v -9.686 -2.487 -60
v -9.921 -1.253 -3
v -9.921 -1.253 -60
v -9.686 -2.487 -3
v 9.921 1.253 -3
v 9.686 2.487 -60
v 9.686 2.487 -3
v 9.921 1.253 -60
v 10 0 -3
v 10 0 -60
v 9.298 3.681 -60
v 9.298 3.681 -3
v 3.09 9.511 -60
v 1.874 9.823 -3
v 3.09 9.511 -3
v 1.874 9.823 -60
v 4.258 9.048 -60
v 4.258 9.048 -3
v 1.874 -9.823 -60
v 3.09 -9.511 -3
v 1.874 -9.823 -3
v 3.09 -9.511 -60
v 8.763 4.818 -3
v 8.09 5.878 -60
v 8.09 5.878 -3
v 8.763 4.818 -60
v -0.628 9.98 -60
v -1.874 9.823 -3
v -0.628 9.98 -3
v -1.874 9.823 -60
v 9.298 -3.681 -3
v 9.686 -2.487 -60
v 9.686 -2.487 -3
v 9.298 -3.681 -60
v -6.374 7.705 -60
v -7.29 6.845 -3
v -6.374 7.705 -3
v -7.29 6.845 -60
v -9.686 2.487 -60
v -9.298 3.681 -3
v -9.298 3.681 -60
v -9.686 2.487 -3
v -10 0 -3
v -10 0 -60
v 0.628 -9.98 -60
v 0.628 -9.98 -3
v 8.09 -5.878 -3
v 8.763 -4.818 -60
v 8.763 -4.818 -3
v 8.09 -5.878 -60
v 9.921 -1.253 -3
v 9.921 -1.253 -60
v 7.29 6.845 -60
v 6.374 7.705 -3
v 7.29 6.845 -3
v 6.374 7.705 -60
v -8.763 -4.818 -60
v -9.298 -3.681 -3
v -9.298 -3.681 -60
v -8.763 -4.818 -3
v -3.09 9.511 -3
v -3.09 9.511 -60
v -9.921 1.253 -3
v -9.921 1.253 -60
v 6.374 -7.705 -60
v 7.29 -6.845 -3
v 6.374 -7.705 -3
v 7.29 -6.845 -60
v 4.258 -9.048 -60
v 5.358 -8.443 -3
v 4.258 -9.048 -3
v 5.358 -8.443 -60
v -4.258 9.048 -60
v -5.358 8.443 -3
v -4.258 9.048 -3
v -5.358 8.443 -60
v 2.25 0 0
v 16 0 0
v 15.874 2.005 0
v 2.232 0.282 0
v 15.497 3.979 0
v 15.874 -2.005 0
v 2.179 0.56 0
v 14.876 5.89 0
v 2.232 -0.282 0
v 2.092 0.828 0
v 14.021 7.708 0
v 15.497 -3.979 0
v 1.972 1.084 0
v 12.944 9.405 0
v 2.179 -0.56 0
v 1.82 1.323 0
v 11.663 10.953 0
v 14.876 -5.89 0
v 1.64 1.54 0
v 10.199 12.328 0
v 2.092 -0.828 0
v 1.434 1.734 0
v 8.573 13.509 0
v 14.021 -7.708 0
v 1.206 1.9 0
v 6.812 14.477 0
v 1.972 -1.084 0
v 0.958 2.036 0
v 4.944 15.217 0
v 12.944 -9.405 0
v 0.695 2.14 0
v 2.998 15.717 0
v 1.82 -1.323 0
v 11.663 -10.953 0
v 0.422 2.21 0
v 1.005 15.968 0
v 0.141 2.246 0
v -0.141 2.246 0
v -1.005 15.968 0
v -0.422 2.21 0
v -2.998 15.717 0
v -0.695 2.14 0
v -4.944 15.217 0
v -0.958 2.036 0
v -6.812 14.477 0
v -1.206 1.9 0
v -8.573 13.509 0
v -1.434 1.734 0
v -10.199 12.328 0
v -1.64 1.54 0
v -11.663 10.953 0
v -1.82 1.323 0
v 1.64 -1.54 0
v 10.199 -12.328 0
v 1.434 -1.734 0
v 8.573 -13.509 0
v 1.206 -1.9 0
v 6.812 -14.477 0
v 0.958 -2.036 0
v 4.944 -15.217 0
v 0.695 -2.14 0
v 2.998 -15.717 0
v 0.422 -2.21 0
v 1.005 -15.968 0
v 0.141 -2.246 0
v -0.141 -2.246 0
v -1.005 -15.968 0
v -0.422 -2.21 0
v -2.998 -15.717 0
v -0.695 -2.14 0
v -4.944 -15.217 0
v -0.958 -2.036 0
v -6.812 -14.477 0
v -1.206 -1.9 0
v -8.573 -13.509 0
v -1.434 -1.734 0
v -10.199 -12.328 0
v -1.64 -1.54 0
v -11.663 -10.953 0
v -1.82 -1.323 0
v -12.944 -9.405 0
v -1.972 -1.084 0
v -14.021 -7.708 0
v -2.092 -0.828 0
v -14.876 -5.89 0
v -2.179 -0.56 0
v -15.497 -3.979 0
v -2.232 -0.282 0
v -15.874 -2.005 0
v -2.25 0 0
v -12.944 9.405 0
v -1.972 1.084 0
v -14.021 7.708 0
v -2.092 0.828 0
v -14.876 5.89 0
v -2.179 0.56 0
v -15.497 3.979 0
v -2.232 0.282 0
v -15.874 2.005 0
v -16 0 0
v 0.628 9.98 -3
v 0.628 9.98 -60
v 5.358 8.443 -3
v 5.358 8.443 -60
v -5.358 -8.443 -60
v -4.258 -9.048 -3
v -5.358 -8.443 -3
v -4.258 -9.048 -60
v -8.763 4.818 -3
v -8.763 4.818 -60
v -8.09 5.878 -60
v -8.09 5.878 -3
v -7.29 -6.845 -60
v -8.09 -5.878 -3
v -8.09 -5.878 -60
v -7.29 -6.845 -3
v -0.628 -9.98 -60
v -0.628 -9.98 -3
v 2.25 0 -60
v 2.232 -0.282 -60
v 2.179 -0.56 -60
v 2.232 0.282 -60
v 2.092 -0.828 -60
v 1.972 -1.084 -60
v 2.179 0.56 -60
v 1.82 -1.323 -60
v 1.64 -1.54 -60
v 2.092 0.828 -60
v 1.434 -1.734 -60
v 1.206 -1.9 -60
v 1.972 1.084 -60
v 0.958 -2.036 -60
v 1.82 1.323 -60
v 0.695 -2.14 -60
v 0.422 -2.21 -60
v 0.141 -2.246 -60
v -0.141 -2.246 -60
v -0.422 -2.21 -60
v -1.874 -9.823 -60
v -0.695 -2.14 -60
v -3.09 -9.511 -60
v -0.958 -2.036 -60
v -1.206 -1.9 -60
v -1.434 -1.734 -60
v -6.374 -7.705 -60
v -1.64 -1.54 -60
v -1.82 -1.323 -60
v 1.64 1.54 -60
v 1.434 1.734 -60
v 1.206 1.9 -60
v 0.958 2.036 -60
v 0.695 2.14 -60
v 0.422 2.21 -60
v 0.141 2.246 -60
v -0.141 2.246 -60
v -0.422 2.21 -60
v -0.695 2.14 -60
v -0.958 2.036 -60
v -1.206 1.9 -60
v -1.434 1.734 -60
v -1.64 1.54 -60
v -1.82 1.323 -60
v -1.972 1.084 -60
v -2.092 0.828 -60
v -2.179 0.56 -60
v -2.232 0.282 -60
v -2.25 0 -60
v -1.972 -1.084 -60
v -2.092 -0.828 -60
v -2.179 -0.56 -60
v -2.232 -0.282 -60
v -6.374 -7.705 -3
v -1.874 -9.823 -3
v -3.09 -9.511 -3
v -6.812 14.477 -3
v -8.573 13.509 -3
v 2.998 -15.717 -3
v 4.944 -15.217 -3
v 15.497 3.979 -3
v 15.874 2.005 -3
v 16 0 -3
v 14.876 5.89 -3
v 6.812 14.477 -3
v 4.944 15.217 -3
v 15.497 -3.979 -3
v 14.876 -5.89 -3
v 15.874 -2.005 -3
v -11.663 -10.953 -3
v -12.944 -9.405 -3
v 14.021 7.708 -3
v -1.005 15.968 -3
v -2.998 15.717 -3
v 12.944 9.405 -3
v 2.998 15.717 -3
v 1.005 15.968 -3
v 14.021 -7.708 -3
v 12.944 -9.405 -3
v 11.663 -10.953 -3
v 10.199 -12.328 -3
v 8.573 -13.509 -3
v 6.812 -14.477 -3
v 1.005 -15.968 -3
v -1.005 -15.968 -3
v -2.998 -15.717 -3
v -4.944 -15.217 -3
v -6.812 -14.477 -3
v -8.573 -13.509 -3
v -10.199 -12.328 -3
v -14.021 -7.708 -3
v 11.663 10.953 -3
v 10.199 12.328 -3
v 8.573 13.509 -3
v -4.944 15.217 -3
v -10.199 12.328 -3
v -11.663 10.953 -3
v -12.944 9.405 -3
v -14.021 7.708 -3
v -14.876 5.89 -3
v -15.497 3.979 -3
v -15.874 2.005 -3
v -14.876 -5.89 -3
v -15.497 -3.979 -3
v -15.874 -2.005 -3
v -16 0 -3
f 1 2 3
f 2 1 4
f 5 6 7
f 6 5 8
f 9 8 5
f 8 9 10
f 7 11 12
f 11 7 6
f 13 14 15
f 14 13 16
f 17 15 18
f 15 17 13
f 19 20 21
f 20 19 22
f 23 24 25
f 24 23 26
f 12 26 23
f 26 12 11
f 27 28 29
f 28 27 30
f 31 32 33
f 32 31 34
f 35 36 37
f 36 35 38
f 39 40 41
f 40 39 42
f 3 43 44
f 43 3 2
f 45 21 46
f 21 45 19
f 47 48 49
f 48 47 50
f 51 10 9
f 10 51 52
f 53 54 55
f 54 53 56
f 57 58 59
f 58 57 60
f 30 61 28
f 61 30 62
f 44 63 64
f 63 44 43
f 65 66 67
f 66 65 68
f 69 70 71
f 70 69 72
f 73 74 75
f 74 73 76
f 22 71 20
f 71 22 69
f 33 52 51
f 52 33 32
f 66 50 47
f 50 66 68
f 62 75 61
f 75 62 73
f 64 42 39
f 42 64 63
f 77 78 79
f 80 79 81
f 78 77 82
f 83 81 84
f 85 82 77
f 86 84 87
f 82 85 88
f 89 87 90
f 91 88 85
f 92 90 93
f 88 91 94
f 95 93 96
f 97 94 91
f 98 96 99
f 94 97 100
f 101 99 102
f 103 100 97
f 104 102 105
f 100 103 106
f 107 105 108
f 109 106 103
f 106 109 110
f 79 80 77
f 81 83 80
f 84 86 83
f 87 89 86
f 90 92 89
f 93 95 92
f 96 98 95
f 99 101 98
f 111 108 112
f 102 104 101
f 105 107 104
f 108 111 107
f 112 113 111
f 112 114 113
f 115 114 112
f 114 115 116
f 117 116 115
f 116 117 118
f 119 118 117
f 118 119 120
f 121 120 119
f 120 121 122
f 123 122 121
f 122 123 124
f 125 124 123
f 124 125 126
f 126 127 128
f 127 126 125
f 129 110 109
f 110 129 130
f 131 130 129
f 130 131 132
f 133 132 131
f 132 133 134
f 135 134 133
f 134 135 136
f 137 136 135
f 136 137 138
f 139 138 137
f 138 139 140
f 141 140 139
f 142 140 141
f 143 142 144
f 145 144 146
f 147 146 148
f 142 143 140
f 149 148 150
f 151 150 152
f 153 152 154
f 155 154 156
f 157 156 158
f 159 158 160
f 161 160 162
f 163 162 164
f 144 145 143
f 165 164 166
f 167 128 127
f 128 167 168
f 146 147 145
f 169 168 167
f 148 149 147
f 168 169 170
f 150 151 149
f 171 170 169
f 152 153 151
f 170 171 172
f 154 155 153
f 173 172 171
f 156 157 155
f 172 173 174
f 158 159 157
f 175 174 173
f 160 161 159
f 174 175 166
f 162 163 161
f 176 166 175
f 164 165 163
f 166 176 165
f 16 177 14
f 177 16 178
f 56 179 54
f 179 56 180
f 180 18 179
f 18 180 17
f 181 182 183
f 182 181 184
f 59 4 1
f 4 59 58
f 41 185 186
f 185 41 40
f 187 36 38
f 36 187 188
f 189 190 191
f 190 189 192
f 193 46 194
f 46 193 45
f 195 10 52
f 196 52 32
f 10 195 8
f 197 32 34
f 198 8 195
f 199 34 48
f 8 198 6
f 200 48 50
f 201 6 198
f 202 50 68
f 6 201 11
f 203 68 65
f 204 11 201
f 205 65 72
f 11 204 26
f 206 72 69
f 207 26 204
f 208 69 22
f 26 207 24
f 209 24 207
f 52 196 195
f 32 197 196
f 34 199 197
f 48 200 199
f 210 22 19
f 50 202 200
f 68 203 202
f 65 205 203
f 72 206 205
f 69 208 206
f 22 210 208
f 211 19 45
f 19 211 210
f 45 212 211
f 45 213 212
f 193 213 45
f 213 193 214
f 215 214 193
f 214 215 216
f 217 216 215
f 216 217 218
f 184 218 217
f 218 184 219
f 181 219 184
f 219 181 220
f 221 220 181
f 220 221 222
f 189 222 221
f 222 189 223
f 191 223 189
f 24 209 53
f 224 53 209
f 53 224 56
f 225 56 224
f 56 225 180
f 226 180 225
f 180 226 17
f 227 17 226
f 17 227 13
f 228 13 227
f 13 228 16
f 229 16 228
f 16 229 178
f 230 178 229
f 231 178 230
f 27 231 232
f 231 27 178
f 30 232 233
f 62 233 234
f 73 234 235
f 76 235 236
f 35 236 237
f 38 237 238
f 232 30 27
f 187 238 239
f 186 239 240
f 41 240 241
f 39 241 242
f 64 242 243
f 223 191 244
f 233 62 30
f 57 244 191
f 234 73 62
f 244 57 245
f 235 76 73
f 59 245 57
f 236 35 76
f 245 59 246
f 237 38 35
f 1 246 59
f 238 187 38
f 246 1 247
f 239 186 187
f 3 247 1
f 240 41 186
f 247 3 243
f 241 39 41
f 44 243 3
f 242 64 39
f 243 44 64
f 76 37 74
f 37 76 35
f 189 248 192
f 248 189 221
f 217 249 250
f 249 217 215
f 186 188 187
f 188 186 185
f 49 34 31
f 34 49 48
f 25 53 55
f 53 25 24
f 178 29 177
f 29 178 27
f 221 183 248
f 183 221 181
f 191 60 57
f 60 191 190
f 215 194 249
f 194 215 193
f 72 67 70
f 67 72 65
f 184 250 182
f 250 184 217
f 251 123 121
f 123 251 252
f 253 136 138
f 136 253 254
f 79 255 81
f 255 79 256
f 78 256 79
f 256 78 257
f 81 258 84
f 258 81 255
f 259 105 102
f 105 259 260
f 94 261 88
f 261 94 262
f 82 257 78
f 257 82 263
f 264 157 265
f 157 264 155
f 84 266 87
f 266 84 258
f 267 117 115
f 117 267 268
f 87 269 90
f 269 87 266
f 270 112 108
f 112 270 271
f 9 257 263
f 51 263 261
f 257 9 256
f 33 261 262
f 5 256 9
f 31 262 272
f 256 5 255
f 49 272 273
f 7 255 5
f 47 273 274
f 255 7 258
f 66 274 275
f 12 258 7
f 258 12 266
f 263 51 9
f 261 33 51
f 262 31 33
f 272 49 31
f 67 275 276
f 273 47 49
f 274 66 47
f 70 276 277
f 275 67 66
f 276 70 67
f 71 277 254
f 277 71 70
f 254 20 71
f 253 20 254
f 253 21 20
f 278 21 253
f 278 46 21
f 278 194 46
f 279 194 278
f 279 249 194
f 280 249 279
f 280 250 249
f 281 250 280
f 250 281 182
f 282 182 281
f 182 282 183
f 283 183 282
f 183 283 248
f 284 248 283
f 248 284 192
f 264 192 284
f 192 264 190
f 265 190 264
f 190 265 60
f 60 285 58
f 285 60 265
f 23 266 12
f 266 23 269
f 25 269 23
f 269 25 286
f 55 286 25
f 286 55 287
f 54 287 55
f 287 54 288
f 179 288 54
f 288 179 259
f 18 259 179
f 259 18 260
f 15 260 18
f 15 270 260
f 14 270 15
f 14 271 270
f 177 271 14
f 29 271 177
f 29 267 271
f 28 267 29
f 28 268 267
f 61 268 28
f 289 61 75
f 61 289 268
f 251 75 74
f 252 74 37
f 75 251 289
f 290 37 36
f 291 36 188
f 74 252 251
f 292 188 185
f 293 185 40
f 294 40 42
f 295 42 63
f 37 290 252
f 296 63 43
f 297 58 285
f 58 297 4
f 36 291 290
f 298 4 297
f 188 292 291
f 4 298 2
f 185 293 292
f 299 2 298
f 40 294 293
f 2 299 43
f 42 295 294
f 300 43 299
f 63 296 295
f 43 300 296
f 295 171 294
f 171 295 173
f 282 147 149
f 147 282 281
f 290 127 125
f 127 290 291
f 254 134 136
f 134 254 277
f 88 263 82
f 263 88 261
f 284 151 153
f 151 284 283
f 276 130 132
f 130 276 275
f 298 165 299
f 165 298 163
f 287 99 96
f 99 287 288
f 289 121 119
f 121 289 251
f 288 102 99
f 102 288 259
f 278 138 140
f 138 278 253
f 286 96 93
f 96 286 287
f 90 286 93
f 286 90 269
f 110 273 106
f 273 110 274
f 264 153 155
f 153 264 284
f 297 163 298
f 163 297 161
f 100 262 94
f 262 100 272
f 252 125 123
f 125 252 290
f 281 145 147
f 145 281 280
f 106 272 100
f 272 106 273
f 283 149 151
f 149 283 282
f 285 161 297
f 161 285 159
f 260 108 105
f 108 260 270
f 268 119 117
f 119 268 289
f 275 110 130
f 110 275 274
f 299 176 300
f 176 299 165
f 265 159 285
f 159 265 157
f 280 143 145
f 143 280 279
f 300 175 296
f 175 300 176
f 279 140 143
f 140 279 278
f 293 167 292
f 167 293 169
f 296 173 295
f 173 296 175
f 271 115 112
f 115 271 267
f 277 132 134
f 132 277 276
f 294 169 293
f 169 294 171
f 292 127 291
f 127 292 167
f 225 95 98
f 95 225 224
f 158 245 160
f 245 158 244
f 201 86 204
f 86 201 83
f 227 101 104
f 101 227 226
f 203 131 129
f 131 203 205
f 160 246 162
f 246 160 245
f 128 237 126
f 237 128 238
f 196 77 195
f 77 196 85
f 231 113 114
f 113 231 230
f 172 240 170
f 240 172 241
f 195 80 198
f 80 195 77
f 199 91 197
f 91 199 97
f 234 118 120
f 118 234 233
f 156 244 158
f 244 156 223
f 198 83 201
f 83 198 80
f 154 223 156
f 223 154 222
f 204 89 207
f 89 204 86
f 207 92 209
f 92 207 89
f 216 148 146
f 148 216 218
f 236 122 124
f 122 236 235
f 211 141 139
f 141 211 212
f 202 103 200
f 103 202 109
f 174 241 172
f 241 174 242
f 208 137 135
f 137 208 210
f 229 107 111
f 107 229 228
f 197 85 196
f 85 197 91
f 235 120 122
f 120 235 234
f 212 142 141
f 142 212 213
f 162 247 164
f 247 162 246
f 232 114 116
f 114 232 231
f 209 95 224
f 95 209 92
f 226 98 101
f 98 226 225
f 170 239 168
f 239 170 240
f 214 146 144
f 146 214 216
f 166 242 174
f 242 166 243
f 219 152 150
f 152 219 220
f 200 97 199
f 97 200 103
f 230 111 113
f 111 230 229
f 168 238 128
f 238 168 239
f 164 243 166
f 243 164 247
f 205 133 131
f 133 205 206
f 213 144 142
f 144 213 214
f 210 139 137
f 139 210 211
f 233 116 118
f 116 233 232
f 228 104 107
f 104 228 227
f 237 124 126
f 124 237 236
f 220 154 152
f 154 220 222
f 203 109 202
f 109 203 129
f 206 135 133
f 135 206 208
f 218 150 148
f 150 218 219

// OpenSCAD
$fn = 50;


difference() {
	union() {
		translate(v = [0, 0, -60.0000000000]) {
			cylinder(h = 60, r = 10.0000000000);
		}
		translate(v = [0, 0, -3.0000000000]) {
			cylinder(h = 3, r = 16.0000000000);
		}
	}
	union() {
		#translate(v = [0, 0, -60]) {
			cylinder(h = 60, r = 2.2500000000);
		}
	}
}
